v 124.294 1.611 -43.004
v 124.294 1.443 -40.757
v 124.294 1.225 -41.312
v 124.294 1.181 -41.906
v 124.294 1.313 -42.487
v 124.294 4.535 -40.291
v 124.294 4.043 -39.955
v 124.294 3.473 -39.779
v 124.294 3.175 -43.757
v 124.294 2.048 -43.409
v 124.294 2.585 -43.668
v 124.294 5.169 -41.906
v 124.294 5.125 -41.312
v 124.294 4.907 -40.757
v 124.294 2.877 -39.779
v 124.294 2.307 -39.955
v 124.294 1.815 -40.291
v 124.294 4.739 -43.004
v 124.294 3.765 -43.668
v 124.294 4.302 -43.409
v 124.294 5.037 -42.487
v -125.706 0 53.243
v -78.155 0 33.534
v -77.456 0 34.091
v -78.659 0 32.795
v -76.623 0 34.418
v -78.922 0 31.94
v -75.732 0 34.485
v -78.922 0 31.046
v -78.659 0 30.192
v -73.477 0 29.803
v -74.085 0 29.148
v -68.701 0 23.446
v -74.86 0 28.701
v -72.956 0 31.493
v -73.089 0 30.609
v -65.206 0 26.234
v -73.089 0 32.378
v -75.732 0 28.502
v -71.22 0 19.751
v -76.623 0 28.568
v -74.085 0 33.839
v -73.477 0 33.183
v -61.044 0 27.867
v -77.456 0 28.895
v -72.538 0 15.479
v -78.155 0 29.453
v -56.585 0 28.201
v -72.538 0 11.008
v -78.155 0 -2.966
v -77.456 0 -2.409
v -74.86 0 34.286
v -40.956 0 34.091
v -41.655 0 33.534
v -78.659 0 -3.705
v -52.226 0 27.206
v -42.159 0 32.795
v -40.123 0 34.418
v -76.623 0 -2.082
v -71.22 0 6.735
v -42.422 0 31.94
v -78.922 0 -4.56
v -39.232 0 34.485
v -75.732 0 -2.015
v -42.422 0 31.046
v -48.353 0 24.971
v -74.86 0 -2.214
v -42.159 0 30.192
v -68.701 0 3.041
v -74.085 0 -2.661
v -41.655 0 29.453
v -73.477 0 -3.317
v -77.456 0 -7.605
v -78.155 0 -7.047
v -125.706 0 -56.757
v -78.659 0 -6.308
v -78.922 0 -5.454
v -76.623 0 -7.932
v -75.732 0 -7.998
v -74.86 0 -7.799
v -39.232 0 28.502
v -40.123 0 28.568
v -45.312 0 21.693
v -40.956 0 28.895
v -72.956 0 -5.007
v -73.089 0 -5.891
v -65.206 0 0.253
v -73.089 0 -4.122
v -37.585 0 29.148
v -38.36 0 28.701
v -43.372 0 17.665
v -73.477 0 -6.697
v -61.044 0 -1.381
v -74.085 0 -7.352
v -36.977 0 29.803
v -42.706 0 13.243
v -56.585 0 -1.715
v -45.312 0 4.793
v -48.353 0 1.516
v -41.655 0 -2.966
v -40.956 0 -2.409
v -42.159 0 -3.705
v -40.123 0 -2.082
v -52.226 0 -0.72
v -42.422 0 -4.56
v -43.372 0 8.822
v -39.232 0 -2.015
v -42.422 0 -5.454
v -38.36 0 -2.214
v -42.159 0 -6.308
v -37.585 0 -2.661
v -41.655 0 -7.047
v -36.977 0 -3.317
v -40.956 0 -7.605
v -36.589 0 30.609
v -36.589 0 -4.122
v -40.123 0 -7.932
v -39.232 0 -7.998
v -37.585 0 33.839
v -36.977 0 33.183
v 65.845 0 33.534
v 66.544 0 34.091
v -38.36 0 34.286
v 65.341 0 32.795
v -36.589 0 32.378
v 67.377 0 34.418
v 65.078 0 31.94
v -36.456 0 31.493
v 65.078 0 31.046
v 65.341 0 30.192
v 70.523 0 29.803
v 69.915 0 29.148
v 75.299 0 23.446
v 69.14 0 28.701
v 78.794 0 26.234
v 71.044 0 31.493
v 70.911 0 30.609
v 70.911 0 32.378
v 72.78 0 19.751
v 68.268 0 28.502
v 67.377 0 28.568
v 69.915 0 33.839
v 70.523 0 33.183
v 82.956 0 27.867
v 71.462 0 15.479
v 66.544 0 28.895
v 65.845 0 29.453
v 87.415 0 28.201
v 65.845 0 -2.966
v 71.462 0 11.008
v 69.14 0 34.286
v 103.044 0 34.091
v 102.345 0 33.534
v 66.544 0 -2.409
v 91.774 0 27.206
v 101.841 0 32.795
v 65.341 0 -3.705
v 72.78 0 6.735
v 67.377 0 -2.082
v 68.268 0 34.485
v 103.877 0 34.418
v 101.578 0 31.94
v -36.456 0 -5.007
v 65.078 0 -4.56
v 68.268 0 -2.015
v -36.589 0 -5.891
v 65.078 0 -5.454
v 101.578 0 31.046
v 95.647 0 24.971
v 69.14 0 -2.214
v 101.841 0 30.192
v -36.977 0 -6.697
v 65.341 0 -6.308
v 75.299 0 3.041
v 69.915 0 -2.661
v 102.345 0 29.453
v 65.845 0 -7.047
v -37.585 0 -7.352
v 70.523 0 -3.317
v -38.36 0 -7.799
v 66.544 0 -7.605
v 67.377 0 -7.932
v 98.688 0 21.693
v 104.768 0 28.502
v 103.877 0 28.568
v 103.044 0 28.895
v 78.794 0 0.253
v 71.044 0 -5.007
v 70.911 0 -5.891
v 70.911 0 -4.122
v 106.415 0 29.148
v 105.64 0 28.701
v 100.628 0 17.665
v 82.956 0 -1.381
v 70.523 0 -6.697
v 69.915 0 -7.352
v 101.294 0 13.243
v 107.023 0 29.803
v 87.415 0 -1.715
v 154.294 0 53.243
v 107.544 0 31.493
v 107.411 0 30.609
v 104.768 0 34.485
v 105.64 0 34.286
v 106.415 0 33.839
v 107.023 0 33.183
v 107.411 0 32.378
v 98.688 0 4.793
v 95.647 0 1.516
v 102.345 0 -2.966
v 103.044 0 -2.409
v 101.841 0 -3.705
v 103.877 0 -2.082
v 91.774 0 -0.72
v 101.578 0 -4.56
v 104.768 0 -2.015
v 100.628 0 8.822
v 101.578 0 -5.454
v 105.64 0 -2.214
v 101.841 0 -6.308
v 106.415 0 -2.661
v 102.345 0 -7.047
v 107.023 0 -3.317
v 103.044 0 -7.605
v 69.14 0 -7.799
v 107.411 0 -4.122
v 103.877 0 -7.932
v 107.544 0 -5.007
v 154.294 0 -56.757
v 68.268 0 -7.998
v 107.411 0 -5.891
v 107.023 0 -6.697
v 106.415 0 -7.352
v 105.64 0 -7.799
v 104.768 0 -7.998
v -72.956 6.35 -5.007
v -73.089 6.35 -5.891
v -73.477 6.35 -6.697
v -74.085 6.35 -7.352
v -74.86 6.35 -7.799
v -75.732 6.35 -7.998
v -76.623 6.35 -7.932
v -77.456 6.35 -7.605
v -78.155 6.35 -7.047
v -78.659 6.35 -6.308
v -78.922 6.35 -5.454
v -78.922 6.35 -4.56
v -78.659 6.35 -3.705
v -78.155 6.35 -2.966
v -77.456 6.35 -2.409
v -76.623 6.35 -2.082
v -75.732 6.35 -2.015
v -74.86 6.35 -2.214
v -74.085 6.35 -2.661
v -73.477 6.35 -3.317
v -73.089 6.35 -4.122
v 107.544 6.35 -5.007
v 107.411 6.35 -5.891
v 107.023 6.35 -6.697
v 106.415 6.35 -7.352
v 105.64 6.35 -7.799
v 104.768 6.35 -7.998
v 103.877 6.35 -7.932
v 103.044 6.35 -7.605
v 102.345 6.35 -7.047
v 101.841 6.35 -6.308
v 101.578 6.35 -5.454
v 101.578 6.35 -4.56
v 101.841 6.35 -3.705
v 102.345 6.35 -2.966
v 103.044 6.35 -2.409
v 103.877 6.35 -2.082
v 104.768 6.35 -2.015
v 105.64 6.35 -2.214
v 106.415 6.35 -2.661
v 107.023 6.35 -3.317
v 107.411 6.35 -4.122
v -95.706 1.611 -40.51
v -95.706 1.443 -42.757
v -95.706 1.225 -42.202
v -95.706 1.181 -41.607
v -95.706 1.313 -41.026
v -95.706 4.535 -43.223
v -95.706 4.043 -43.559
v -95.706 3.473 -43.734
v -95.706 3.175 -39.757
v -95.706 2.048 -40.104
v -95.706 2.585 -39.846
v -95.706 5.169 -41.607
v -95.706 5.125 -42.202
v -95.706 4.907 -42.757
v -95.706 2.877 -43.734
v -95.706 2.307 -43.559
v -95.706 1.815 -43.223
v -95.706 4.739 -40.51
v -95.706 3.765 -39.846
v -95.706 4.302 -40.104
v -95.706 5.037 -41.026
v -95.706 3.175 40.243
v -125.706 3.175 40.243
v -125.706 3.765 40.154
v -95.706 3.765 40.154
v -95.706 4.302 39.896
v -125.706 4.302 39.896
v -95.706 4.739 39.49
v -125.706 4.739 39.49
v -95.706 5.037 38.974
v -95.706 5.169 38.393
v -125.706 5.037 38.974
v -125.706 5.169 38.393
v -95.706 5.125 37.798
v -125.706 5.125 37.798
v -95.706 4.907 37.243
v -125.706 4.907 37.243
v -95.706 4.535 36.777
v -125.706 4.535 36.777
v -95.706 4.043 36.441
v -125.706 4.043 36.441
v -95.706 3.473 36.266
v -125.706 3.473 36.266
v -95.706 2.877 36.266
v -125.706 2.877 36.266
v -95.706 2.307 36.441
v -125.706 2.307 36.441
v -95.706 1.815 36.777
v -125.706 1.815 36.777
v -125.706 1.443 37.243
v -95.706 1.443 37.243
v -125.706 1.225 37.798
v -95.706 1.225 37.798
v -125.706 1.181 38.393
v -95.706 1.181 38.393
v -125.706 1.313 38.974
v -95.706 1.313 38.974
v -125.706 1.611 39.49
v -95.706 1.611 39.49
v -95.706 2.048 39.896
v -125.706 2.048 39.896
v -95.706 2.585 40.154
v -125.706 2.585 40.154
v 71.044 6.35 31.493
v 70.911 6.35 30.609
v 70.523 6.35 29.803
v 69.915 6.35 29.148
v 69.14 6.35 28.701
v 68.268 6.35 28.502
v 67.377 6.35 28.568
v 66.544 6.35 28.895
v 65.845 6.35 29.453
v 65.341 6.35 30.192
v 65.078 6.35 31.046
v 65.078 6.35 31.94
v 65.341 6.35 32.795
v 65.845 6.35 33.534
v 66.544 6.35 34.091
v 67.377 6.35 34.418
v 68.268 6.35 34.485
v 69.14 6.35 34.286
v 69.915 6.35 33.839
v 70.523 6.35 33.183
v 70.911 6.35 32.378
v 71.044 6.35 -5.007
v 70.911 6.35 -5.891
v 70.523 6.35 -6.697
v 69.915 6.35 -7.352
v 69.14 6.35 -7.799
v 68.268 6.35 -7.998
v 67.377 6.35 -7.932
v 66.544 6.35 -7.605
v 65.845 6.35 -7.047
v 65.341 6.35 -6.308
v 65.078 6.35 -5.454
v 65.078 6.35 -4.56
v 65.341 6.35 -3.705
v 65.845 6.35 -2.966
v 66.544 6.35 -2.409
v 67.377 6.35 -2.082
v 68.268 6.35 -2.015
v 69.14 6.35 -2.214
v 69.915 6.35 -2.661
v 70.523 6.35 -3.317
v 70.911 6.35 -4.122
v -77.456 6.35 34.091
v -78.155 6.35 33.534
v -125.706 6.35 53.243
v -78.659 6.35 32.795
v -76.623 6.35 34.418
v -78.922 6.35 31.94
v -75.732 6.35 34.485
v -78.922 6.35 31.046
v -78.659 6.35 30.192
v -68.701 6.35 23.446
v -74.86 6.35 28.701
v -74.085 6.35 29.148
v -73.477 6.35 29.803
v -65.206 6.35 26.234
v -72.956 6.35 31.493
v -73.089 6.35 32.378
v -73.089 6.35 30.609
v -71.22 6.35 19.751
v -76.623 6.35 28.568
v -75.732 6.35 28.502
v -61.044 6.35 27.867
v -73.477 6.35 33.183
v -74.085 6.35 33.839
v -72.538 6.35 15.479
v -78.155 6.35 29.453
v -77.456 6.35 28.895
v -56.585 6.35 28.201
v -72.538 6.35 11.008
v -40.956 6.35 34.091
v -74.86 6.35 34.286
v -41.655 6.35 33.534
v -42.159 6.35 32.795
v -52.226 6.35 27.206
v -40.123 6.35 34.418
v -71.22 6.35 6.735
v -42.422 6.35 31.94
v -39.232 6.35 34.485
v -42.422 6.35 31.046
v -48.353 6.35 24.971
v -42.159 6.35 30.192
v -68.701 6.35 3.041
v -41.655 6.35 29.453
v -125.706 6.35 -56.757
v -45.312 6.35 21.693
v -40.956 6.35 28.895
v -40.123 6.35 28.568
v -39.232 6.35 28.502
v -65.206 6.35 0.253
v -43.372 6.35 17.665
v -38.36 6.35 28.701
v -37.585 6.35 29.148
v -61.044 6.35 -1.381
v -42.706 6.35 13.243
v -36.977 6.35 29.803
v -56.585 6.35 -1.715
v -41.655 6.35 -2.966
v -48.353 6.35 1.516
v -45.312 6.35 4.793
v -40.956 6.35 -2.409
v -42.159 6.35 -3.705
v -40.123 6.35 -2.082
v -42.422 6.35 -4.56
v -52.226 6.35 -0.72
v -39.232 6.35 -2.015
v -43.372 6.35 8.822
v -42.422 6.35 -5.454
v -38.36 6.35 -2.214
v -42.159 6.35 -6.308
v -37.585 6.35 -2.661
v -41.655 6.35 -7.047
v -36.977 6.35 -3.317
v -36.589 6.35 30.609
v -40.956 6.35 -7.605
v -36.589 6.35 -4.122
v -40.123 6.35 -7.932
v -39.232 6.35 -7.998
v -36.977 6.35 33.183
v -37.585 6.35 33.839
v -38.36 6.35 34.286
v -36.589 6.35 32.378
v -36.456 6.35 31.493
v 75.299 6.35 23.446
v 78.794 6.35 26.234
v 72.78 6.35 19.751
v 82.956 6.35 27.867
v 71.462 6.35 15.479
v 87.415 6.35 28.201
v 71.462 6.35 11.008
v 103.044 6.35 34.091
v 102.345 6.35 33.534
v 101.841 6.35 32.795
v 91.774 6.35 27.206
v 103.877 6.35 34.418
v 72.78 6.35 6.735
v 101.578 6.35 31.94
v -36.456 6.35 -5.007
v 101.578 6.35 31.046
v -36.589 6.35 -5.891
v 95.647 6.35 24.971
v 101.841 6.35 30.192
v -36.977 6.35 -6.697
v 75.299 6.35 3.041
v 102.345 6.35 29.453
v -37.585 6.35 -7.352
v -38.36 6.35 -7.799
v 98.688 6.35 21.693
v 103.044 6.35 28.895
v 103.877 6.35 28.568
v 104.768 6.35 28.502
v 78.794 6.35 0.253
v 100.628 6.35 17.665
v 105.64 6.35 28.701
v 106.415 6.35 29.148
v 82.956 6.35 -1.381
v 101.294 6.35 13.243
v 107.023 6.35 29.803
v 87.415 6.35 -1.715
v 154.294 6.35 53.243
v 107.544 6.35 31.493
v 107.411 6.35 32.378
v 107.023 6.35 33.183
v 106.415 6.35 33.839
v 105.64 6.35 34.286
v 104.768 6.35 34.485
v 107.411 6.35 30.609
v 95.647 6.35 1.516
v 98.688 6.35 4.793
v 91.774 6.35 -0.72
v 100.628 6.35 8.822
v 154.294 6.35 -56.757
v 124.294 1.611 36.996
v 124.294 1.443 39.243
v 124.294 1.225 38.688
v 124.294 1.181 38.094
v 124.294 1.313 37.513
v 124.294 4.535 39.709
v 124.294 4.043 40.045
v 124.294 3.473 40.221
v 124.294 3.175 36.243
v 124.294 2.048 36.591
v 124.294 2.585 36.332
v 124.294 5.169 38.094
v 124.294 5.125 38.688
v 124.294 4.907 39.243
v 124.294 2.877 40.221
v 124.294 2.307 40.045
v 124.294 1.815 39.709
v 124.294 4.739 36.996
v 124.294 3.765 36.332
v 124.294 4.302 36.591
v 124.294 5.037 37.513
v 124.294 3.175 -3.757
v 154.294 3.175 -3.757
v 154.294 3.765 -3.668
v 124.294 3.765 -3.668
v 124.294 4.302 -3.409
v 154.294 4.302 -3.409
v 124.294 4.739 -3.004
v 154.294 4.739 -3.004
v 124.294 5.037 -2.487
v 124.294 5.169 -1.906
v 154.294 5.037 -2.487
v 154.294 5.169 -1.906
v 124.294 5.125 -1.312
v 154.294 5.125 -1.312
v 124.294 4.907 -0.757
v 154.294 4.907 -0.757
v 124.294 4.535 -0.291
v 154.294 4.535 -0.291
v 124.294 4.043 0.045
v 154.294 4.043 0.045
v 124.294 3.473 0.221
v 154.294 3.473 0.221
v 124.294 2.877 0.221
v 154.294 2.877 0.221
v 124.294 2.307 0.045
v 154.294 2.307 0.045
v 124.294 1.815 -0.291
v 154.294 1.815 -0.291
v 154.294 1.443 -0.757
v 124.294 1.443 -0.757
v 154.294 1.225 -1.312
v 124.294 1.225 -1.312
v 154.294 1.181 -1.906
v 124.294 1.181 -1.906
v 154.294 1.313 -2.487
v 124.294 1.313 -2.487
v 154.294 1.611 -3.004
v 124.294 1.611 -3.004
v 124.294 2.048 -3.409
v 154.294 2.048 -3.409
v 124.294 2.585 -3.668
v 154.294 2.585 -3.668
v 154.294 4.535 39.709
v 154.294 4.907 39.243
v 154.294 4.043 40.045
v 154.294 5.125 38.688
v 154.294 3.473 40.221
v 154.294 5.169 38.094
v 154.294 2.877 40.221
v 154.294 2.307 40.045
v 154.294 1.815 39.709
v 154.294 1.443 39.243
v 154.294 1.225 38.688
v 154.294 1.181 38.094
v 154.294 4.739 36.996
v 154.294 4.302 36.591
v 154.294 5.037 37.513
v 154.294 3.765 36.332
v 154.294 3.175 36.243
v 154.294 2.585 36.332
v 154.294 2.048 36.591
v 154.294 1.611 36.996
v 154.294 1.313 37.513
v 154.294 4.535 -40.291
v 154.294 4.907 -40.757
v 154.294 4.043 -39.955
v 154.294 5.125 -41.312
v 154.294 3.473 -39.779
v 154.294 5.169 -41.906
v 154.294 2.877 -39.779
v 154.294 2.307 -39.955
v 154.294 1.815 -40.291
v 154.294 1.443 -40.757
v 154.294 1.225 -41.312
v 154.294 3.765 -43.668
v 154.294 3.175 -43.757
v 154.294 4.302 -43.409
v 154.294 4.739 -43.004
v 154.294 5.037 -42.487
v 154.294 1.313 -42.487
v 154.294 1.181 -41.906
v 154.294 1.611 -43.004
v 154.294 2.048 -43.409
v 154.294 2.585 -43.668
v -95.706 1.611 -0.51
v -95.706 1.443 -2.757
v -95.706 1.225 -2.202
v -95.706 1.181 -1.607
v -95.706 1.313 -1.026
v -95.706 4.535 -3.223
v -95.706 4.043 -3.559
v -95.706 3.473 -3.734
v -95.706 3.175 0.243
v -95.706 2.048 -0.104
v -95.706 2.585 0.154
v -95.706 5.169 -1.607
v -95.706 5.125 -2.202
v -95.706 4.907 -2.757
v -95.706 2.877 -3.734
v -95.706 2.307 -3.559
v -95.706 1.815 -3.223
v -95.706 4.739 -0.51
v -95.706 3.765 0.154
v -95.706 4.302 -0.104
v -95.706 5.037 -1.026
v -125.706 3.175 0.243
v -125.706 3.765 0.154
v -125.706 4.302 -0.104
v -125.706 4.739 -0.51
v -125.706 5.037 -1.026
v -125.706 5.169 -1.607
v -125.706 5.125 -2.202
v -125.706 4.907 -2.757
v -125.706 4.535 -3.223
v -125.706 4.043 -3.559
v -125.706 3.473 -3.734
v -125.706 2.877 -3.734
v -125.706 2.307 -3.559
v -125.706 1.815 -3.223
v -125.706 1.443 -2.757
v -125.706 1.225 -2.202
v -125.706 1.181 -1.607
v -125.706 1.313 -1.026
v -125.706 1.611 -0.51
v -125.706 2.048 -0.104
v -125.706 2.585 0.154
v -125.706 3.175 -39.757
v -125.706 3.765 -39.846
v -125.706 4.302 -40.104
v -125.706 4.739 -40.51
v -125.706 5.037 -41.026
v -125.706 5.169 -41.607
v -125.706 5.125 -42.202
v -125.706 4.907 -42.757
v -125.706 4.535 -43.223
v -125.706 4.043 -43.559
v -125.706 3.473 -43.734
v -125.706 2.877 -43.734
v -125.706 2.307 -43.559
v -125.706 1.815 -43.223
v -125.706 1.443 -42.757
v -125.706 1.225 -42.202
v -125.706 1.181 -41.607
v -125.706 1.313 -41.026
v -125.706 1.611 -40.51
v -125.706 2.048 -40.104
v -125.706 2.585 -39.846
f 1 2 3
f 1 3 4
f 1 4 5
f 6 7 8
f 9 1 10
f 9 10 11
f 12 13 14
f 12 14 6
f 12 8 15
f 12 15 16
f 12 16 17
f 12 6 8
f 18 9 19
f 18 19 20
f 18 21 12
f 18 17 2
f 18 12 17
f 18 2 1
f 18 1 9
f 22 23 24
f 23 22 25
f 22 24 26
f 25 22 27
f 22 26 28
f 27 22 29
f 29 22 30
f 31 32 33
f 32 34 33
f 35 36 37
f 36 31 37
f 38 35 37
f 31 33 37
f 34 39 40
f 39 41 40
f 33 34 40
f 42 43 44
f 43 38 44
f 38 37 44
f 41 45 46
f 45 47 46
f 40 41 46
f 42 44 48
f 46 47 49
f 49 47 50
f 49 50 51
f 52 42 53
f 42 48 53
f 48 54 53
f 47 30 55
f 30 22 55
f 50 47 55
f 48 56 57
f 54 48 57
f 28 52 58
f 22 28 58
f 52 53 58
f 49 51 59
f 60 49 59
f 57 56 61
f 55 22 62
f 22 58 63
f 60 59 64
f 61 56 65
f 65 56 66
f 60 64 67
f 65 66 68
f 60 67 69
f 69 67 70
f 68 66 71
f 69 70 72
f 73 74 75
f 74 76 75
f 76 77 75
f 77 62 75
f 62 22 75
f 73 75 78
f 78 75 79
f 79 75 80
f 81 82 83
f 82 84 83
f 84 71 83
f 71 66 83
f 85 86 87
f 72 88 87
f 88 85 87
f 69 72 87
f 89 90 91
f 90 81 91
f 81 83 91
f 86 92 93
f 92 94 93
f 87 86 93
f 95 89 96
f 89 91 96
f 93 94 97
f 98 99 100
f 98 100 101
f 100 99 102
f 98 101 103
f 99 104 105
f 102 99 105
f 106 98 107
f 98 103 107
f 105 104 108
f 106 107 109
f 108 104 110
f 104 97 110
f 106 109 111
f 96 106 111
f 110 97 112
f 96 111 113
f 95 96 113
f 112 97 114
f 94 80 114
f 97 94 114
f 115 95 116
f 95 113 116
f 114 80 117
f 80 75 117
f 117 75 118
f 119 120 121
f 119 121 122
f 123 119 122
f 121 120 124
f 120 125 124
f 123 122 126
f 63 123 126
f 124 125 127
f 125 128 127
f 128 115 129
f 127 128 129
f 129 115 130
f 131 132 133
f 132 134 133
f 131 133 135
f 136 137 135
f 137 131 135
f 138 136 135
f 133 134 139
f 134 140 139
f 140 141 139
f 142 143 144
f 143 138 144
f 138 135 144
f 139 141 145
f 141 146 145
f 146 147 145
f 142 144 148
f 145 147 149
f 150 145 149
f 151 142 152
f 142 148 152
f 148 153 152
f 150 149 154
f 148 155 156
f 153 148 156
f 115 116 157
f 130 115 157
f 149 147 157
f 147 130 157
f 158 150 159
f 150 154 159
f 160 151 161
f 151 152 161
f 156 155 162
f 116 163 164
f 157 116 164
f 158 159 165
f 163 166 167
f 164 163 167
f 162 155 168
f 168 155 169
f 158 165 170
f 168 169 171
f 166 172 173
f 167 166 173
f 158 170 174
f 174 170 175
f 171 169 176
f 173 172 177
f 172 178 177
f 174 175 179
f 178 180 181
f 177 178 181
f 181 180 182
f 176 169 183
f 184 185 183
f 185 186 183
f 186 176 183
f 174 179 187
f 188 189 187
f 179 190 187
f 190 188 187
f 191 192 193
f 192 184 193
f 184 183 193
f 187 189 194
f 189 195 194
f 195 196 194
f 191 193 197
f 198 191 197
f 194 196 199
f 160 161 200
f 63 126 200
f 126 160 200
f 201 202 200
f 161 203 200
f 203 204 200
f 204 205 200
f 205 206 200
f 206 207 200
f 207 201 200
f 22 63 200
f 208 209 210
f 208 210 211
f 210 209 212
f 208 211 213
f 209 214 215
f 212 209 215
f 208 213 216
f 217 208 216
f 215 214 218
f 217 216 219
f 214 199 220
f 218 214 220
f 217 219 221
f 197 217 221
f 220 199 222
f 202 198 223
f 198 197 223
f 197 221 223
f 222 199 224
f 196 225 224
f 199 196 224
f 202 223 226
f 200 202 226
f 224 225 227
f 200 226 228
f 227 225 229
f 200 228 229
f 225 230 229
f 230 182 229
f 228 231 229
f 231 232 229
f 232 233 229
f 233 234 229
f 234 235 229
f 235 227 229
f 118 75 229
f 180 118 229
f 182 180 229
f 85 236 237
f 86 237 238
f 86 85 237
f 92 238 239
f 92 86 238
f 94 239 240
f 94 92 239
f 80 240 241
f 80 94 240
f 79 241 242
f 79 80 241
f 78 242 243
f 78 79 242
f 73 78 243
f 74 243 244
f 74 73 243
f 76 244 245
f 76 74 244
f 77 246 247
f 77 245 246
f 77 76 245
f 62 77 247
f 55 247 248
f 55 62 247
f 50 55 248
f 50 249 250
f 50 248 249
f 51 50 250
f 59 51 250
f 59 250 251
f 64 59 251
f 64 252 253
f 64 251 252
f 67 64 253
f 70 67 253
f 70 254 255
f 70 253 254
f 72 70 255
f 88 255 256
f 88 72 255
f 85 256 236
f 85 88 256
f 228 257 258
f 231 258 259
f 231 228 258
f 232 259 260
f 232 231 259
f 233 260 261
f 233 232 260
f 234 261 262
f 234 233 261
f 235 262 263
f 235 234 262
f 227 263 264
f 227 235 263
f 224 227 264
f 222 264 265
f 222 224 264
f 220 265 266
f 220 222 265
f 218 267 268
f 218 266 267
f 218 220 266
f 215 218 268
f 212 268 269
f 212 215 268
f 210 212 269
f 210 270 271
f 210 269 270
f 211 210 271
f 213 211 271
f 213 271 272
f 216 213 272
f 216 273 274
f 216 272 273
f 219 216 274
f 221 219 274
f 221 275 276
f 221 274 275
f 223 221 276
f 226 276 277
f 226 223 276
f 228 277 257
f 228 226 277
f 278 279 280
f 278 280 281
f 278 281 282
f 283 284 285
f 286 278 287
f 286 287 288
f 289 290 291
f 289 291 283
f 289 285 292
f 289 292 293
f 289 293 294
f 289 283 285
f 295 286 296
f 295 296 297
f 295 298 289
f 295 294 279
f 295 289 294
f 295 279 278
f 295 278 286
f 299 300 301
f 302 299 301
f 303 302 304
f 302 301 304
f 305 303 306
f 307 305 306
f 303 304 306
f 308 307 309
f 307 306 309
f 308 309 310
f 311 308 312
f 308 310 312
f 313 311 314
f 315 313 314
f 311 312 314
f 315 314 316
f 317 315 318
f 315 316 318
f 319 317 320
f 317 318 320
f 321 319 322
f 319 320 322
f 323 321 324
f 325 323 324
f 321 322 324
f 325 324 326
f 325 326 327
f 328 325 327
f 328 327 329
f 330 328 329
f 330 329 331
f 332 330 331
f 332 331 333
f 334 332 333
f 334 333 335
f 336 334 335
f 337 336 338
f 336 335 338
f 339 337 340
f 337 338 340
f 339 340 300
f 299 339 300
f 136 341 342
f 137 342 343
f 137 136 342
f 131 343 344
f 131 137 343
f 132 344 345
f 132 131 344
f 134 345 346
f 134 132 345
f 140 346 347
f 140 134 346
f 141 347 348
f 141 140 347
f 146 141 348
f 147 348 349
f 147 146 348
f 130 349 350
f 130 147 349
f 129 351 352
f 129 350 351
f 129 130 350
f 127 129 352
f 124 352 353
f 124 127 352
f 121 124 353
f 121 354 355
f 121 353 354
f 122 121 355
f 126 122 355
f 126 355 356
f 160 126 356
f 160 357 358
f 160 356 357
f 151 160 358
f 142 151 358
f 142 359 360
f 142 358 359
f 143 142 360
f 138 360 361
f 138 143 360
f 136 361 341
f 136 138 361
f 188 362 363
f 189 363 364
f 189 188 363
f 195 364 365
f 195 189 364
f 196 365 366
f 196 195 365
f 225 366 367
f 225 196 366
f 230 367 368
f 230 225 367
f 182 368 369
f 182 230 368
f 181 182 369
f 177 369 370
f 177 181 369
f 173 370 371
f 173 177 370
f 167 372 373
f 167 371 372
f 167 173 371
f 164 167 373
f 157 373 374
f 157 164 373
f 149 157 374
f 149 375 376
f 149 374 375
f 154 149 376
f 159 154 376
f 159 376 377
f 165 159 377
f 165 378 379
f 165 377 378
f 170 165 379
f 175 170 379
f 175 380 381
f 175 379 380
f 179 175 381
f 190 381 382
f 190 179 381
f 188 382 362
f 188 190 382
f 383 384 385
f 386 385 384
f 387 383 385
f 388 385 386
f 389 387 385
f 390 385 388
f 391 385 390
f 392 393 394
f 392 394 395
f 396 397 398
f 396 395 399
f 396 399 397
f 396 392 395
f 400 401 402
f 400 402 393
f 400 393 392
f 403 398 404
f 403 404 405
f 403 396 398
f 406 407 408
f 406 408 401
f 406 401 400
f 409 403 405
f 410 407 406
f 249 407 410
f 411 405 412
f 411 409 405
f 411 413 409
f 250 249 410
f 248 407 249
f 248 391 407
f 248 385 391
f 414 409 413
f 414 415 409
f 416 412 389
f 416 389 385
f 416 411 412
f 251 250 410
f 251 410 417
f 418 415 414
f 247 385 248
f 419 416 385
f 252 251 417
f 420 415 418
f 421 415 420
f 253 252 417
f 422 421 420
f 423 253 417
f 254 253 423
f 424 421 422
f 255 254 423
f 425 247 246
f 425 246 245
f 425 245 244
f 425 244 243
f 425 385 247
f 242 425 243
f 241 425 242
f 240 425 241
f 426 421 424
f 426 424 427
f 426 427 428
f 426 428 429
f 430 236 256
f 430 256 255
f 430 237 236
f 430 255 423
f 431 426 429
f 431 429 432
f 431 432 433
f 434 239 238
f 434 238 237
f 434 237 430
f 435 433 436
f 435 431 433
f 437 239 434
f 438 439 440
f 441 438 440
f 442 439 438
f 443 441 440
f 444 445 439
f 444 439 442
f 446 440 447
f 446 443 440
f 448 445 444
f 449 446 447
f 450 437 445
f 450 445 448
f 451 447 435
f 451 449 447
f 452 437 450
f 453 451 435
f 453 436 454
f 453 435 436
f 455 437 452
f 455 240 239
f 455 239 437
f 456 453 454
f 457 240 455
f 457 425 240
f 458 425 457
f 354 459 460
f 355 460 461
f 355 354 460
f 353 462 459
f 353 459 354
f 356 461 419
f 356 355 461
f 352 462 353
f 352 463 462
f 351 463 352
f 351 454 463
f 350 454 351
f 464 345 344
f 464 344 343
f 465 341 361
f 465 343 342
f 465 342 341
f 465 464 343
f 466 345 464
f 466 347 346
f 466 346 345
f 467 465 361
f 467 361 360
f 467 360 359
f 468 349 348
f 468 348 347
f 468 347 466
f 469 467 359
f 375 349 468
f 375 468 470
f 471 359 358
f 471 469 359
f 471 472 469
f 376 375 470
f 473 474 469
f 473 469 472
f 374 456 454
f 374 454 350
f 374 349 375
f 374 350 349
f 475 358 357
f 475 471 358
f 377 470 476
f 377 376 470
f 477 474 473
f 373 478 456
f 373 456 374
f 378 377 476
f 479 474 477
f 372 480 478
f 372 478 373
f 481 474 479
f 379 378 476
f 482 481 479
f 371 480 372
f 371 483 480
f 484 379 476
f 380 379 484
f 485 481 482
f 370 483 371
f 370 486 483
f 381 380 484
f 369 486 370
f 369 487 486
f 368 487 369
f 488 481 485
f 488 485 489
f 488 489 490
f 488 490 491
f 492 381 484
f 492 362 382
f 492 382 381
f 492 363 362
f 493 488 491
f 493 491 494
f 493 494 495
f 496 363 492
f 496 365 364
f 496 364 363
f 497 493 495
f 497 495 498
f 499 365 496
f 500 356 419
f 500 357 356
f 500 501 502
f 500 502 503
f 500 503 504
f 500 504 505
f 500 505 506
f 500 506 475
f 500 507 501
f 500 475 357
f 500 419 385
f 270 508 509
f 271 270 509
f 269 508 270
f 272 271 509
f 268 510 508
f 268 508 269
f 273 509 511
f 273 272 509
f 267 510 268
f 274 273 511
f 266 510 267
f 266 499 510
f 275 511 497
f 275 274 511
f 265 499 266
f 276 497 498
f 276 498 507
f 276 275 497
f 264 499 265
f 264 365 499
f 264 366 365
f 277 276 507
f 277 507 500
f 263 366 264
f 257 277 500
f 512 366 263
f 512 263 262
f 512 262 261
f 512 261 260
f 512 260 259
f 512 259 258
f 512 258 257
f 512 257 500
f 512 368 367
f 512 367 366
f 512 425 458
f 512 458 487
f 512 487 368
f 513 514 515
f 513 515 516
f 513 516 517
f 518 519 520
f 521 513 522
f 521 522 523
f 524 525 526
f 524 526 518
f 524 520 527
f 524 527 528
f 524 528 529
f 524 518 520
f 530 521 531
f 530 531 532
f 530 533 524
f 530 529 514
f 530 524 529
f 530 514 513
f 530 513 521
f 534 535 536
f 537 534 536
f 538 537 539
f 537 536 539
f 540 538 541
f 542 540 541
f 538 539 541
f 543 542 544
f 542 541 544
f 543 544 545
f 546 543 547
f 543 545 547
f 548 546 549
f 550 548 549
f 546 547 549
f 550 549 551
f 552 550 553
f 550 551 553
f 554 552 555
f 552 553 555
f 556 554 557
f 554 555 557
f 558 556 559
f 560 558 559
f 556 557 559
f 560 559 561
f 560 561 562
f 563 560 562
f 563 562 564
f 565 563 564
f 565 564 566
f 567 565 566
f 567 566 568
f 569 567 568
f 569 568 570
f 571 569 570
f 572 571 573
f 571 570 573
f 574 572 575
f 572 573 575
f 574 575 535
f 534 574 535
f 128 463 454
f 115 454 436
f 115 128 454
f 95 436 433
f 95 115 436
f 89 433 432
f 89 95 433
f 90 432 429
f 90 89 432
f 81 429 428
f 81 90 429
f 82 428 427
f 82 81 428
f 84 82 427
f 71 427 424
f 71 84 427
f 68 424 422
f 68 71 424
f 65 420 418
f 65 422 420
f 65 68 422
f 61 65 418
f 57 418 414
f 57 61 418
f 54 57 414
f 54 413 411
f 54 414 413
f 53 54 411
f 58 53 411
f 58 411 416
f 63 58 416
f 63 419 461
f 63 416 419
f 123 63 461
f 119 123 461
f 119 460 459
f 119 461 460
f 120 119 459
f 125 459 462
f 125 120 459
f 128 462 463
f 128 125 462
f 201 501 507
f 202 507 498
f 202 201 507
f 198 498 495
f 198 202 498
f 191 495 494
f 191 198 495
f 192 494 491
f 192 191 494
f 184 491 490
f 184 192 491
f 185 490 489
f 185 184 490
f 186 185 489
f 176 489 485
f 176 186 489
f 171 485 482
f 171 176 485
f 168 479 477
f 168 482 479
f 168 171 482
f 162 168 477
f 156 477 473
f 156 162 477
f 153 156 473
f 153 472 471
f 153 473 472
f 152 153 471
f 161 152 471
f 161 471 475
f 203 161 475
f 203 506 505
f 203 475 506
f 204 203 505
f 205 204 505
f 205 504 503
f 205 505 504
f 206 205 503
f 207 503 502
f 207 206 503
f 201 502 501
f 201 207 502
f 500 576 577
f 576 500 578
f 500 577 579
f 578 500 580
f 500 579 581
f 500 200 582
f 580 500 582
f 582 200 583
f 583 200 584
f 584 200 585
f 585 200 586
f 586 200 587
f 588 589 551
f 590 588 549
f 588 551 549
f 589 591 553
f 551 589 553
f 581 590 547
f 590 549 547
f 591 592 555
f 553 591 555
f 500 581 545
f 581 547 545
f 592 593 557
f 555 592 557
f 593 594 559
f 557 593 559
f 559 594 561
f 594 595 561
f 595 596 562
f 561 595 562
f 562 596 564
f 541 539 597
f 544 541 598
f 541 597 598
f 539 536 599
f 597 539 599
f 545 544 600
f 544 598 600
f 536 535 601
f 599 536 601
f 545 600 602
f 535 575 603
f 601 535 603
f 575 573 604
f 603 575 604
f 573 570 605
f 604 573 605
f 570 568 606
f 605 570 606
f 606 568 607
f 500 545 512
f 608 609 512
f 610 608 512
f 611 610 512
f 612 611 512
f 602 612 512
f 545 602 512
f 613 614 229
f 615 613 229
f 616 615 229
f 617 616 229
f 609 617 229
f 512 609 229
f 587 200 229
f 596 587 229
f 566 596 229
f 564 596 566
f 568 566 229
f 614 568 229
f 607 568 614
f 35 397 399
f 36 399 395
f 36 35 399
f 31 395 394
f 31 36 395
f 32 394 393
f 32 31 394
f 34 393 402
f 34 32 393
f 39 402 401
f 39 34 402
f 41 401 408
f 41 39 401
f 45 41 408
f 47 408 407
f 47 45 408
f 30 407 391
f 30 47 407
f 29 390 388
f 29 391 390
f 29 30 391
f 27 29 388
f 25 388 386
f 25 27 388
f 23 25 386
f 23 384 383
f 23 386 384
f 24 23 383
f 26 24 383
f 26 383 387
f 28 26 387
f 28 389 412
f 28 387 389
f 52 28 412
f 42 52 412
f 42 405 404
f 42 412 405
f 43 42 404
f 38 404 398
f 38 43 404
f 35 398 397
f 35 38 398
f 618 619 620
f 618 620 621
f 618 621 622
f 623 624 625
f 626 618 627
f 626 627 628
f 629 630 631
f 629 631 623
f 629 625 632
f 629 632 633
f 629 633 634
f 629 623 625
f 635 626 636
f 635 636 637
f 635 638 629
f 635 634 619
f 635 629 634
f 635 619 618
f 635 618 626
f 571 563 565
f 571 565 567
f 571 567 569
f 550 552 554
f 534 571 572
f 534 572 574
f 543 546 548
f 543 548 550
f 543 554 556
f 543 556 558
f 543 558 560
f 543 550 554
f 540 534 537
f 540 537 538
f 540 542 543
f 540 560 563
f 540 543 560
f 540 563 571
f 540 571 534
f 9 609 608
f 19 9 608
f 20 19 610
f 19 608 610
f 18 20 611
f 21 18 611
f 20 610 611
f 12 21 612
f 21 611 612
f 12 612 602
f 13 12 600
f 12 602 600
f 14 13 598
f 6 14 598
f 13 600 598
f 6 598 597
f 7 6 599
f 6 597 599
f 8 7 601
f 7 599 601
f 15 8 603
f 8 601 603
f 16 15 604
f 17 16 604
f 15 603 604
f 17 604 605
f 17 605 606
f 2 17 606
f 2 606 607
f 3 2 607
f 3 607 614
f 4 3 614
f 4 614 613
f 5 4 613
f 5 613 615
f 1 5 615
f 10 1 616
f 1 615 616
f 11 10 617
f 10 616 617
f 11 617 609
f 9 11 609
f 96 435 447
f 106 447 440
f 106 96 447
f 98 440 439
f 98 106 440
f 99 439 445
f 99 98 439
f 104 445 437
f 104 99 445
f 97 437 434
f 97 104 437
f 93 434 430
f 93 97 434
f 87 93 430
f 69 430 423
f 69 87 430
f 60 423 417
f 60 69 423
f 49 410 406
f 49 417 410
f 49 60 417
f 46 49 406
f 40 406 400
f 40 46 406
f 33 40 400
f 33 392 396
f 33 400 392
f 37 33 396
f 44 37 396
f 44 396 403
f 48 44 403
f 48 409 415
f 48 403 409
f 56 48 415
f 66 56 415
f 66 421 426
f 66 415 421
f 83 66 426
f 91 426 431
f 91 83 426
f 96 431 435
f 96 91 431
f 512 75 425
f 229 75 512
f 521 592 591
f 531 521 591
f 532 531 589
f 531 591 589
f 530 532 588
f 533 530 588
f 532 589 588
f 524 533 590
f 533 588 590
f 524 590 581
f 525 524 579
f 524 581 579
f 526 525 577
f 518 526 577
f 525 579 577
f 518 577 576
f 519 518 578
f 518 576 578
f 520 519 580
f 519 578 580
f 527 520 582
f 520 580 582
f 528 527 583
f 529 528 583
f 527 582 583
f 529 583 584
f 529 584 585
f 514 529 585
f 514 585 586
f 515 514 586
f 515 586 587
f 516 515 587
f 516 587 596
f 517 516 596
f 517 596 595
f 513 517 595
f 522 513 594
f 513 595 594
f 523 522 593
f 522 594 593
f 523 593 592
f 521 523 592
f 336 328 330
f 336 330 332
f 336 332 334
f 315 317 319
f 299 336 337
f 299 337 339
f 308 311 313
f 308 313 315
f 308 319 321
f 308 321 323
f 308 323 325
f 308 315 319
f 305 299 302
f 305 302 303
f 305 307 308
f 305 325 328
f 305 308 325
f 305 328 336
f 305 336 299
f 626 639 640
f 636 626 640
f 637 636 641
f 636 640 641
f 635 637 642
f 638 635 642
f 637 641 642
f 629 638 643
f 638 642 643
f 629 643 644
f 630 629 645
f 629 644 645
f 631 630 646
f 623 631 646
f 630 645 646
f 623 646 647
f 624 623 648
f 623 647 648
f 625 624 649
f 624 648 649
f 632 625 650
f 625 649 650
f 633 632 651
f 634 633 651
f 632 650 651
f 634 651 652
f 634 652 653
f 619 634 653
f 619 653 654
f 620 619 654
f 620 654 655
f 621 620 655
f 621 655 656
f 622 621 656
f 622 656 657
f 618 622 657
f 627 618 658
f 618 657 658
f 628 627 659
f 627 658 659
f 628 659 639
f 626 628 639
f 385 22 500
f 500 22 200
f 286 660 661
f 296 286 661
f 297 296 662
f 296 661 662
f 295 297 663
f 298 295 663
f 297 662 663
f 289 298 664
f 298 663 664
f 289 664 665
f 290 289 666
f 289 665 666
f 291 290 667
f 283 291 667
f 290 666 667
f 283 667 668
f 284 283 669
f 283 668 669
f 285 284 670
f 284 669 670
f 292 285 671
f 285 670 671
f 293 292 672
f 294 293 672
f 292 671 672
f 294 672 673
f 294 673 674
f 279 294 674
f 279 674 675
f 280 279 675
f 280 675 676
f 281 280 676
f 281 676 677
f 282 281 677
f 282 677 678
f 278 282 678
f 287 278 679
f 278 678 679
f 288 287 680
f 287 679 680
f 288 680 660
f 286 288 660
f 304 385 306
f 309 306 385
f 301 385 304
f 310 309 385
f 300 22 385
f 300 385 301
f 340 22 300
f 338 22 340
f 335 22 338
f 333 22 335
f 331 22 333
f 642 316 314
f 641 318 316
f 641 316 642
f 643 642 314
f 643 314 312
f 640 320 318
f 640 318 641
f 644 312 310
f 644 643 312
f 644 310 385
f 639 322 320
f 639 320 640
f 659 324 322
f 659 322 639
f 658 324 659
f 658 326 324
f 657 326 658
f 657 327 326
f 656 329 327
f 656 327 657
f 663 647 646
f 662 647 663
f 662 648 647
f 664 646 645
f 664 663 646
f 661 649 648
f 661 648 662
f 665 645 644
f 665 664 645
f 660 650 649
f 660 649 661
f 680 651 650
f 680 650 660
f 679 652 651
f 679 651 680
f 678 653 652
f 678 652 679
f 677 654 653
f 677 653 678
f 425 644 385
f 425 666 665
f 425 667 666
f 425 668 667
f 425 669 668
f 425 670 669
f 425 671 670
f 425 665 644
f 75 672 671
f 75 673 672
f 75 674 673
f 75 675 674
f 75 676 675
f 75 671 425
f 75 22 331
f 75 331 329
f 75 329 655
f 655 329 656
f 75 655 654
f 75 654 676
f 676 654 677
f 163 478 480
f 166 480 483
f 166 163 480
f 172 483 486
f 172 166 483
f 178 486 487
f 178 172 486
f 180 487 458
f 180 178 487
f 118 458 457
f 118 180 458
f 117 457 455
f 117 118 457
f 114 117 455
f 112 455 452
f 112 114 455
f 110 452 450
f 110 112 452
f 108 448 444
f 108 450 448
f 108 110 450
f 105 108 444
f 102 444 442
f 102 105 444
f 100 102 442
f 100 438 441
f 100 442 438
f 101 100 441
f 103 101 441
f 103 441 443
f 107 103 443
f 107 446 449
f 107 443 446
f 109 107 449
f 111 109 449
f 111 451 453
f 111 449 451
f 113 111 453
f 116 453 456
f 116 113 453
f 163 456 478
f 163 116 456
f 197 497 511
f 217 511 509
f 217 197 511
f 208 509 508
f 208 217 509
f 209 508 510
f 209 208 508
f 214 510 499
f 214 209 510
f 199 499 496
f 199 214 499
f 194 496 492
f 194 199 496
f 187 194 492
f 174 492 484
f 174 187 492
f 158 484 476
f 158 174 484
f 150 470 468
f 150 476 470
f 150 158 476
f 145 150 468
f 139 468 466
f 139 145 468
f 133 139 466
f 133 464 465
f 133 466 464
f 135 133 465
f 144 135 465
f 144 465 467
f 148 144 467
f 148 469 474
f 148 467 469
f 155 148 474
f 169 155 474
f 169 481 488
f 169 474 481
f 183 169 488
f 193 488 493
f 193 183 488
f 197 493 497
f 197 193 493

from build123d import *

# Parameters (mm, degrees)
CROQUIS1_W              = 280
CROQUIS1_H              = 110
SALIENTE_EXTRUIR1_DEPTH = 6.35
CROQUIS2_R              = 3
CROQUIS2_R_2            = 15
CORTAR_EXTRUIR2_DEPTH   = 20
CROQUIS5_R              = 2
CORTAR_EXTRUIR5_DEPTH   = 30
CROQUIS6_R              = 2
CORTAR_EXTRUIR6_DEPTH   = 30


with BuildPart() as part:
    # Croquis1 → Saliente-Extruir1 (new body)
    with BuildSketch(Plane(origin=(0, 0, 0), x_dir=(1, 0, 0), z_dir=(0, 1, 0))):
        with Locations((14.294294294, 1.756756757)):
            Rectangle(CROQUIS1_W, CROQUIS1_H)
    extrude(amount=SALIENTE_EXTRUIR1_DEPTH)

    # Croquis2 → Cortar-Extruir2 (cut)
    with BuildSketch(Plane(origin=(0, 0, 0), x_dir=(1, 0, 0), z_dir=(0, 1, 0))):
        with Locations((-39.455705706, 5.006756757)):
            Circle(CROQUIS2_R)
        with Locations((-75.955705706, 5.006756757)):
            Circle(CROQUIS2_R)
        with Locations((86.294294294, -13.243243243)):
            Circle(CROQUIS2_R_2)
        with Locations((-57.705705706, -13.243243243)):
            Circle(CROQUIS2_R_2)
        with Locations((-39.455705706, -31.493243243)):
            Circle(CROQUIS2_R)
        with Locations((-75.955705706, -31.493243243)):
            Circle(CROQUIS2_R)
        with Locations((104.544294294, 5.006756757)):
            Circle(CROQUIS2_R)
        with Locations((68.044294294, 5.006756757)):
            Circle(CROQUIS2_R)
        with Locations((104.544294294, -31.493243243)):
            Circle(CROQUIS2_R)
        with Locations((68.044294294, -31.493243243)):
            Circle(CROQUIS2_R)
    extrude(amount=CORTAR_EXTRUIR2_DEPTH, mode=Mode.SUBTRACT)

    # Croquis5 → Cortar-Extruir5 (cut)
    with BuildSketch(Plane.ZY.offset(125.705705706)):
        with Locations((38.243243243, 3.175)):
            Circle(CROQUIS5_R)
        with Locations((-41.756756757, 3.175)):
            Circle(CROQUIS5_R)
        with Locations((-1.756756757, 3.175)):
            Circle(CROQUIS5_R)
    extrude(amount=-CORTAR_EXTRUIR5_DEPTH, mode=Mode.SUBTRACT)

    # Croquis6 → Cortar-Extruir6 (cut)
    with BuildSketch(Plane(origin=(154.294294294, 0, 0), x_dir=(0, 0, -1), z_dir=(1, 0, 0))):
        with Locations((41.756756757, 3.175)):
            Circle(CROQUIS6_R)
        with Locations((-38.243243243, 3.175)):
            Circle(CROQUIS6_R)
        with Locations((1.756756757, 3.175)):
            Circle(CROQUIS6_R)
    extrude(amount=-CORTAR_EXTRUIR6_DEPTH, mode=Mode.SUBTRACT)


solid = part.part
